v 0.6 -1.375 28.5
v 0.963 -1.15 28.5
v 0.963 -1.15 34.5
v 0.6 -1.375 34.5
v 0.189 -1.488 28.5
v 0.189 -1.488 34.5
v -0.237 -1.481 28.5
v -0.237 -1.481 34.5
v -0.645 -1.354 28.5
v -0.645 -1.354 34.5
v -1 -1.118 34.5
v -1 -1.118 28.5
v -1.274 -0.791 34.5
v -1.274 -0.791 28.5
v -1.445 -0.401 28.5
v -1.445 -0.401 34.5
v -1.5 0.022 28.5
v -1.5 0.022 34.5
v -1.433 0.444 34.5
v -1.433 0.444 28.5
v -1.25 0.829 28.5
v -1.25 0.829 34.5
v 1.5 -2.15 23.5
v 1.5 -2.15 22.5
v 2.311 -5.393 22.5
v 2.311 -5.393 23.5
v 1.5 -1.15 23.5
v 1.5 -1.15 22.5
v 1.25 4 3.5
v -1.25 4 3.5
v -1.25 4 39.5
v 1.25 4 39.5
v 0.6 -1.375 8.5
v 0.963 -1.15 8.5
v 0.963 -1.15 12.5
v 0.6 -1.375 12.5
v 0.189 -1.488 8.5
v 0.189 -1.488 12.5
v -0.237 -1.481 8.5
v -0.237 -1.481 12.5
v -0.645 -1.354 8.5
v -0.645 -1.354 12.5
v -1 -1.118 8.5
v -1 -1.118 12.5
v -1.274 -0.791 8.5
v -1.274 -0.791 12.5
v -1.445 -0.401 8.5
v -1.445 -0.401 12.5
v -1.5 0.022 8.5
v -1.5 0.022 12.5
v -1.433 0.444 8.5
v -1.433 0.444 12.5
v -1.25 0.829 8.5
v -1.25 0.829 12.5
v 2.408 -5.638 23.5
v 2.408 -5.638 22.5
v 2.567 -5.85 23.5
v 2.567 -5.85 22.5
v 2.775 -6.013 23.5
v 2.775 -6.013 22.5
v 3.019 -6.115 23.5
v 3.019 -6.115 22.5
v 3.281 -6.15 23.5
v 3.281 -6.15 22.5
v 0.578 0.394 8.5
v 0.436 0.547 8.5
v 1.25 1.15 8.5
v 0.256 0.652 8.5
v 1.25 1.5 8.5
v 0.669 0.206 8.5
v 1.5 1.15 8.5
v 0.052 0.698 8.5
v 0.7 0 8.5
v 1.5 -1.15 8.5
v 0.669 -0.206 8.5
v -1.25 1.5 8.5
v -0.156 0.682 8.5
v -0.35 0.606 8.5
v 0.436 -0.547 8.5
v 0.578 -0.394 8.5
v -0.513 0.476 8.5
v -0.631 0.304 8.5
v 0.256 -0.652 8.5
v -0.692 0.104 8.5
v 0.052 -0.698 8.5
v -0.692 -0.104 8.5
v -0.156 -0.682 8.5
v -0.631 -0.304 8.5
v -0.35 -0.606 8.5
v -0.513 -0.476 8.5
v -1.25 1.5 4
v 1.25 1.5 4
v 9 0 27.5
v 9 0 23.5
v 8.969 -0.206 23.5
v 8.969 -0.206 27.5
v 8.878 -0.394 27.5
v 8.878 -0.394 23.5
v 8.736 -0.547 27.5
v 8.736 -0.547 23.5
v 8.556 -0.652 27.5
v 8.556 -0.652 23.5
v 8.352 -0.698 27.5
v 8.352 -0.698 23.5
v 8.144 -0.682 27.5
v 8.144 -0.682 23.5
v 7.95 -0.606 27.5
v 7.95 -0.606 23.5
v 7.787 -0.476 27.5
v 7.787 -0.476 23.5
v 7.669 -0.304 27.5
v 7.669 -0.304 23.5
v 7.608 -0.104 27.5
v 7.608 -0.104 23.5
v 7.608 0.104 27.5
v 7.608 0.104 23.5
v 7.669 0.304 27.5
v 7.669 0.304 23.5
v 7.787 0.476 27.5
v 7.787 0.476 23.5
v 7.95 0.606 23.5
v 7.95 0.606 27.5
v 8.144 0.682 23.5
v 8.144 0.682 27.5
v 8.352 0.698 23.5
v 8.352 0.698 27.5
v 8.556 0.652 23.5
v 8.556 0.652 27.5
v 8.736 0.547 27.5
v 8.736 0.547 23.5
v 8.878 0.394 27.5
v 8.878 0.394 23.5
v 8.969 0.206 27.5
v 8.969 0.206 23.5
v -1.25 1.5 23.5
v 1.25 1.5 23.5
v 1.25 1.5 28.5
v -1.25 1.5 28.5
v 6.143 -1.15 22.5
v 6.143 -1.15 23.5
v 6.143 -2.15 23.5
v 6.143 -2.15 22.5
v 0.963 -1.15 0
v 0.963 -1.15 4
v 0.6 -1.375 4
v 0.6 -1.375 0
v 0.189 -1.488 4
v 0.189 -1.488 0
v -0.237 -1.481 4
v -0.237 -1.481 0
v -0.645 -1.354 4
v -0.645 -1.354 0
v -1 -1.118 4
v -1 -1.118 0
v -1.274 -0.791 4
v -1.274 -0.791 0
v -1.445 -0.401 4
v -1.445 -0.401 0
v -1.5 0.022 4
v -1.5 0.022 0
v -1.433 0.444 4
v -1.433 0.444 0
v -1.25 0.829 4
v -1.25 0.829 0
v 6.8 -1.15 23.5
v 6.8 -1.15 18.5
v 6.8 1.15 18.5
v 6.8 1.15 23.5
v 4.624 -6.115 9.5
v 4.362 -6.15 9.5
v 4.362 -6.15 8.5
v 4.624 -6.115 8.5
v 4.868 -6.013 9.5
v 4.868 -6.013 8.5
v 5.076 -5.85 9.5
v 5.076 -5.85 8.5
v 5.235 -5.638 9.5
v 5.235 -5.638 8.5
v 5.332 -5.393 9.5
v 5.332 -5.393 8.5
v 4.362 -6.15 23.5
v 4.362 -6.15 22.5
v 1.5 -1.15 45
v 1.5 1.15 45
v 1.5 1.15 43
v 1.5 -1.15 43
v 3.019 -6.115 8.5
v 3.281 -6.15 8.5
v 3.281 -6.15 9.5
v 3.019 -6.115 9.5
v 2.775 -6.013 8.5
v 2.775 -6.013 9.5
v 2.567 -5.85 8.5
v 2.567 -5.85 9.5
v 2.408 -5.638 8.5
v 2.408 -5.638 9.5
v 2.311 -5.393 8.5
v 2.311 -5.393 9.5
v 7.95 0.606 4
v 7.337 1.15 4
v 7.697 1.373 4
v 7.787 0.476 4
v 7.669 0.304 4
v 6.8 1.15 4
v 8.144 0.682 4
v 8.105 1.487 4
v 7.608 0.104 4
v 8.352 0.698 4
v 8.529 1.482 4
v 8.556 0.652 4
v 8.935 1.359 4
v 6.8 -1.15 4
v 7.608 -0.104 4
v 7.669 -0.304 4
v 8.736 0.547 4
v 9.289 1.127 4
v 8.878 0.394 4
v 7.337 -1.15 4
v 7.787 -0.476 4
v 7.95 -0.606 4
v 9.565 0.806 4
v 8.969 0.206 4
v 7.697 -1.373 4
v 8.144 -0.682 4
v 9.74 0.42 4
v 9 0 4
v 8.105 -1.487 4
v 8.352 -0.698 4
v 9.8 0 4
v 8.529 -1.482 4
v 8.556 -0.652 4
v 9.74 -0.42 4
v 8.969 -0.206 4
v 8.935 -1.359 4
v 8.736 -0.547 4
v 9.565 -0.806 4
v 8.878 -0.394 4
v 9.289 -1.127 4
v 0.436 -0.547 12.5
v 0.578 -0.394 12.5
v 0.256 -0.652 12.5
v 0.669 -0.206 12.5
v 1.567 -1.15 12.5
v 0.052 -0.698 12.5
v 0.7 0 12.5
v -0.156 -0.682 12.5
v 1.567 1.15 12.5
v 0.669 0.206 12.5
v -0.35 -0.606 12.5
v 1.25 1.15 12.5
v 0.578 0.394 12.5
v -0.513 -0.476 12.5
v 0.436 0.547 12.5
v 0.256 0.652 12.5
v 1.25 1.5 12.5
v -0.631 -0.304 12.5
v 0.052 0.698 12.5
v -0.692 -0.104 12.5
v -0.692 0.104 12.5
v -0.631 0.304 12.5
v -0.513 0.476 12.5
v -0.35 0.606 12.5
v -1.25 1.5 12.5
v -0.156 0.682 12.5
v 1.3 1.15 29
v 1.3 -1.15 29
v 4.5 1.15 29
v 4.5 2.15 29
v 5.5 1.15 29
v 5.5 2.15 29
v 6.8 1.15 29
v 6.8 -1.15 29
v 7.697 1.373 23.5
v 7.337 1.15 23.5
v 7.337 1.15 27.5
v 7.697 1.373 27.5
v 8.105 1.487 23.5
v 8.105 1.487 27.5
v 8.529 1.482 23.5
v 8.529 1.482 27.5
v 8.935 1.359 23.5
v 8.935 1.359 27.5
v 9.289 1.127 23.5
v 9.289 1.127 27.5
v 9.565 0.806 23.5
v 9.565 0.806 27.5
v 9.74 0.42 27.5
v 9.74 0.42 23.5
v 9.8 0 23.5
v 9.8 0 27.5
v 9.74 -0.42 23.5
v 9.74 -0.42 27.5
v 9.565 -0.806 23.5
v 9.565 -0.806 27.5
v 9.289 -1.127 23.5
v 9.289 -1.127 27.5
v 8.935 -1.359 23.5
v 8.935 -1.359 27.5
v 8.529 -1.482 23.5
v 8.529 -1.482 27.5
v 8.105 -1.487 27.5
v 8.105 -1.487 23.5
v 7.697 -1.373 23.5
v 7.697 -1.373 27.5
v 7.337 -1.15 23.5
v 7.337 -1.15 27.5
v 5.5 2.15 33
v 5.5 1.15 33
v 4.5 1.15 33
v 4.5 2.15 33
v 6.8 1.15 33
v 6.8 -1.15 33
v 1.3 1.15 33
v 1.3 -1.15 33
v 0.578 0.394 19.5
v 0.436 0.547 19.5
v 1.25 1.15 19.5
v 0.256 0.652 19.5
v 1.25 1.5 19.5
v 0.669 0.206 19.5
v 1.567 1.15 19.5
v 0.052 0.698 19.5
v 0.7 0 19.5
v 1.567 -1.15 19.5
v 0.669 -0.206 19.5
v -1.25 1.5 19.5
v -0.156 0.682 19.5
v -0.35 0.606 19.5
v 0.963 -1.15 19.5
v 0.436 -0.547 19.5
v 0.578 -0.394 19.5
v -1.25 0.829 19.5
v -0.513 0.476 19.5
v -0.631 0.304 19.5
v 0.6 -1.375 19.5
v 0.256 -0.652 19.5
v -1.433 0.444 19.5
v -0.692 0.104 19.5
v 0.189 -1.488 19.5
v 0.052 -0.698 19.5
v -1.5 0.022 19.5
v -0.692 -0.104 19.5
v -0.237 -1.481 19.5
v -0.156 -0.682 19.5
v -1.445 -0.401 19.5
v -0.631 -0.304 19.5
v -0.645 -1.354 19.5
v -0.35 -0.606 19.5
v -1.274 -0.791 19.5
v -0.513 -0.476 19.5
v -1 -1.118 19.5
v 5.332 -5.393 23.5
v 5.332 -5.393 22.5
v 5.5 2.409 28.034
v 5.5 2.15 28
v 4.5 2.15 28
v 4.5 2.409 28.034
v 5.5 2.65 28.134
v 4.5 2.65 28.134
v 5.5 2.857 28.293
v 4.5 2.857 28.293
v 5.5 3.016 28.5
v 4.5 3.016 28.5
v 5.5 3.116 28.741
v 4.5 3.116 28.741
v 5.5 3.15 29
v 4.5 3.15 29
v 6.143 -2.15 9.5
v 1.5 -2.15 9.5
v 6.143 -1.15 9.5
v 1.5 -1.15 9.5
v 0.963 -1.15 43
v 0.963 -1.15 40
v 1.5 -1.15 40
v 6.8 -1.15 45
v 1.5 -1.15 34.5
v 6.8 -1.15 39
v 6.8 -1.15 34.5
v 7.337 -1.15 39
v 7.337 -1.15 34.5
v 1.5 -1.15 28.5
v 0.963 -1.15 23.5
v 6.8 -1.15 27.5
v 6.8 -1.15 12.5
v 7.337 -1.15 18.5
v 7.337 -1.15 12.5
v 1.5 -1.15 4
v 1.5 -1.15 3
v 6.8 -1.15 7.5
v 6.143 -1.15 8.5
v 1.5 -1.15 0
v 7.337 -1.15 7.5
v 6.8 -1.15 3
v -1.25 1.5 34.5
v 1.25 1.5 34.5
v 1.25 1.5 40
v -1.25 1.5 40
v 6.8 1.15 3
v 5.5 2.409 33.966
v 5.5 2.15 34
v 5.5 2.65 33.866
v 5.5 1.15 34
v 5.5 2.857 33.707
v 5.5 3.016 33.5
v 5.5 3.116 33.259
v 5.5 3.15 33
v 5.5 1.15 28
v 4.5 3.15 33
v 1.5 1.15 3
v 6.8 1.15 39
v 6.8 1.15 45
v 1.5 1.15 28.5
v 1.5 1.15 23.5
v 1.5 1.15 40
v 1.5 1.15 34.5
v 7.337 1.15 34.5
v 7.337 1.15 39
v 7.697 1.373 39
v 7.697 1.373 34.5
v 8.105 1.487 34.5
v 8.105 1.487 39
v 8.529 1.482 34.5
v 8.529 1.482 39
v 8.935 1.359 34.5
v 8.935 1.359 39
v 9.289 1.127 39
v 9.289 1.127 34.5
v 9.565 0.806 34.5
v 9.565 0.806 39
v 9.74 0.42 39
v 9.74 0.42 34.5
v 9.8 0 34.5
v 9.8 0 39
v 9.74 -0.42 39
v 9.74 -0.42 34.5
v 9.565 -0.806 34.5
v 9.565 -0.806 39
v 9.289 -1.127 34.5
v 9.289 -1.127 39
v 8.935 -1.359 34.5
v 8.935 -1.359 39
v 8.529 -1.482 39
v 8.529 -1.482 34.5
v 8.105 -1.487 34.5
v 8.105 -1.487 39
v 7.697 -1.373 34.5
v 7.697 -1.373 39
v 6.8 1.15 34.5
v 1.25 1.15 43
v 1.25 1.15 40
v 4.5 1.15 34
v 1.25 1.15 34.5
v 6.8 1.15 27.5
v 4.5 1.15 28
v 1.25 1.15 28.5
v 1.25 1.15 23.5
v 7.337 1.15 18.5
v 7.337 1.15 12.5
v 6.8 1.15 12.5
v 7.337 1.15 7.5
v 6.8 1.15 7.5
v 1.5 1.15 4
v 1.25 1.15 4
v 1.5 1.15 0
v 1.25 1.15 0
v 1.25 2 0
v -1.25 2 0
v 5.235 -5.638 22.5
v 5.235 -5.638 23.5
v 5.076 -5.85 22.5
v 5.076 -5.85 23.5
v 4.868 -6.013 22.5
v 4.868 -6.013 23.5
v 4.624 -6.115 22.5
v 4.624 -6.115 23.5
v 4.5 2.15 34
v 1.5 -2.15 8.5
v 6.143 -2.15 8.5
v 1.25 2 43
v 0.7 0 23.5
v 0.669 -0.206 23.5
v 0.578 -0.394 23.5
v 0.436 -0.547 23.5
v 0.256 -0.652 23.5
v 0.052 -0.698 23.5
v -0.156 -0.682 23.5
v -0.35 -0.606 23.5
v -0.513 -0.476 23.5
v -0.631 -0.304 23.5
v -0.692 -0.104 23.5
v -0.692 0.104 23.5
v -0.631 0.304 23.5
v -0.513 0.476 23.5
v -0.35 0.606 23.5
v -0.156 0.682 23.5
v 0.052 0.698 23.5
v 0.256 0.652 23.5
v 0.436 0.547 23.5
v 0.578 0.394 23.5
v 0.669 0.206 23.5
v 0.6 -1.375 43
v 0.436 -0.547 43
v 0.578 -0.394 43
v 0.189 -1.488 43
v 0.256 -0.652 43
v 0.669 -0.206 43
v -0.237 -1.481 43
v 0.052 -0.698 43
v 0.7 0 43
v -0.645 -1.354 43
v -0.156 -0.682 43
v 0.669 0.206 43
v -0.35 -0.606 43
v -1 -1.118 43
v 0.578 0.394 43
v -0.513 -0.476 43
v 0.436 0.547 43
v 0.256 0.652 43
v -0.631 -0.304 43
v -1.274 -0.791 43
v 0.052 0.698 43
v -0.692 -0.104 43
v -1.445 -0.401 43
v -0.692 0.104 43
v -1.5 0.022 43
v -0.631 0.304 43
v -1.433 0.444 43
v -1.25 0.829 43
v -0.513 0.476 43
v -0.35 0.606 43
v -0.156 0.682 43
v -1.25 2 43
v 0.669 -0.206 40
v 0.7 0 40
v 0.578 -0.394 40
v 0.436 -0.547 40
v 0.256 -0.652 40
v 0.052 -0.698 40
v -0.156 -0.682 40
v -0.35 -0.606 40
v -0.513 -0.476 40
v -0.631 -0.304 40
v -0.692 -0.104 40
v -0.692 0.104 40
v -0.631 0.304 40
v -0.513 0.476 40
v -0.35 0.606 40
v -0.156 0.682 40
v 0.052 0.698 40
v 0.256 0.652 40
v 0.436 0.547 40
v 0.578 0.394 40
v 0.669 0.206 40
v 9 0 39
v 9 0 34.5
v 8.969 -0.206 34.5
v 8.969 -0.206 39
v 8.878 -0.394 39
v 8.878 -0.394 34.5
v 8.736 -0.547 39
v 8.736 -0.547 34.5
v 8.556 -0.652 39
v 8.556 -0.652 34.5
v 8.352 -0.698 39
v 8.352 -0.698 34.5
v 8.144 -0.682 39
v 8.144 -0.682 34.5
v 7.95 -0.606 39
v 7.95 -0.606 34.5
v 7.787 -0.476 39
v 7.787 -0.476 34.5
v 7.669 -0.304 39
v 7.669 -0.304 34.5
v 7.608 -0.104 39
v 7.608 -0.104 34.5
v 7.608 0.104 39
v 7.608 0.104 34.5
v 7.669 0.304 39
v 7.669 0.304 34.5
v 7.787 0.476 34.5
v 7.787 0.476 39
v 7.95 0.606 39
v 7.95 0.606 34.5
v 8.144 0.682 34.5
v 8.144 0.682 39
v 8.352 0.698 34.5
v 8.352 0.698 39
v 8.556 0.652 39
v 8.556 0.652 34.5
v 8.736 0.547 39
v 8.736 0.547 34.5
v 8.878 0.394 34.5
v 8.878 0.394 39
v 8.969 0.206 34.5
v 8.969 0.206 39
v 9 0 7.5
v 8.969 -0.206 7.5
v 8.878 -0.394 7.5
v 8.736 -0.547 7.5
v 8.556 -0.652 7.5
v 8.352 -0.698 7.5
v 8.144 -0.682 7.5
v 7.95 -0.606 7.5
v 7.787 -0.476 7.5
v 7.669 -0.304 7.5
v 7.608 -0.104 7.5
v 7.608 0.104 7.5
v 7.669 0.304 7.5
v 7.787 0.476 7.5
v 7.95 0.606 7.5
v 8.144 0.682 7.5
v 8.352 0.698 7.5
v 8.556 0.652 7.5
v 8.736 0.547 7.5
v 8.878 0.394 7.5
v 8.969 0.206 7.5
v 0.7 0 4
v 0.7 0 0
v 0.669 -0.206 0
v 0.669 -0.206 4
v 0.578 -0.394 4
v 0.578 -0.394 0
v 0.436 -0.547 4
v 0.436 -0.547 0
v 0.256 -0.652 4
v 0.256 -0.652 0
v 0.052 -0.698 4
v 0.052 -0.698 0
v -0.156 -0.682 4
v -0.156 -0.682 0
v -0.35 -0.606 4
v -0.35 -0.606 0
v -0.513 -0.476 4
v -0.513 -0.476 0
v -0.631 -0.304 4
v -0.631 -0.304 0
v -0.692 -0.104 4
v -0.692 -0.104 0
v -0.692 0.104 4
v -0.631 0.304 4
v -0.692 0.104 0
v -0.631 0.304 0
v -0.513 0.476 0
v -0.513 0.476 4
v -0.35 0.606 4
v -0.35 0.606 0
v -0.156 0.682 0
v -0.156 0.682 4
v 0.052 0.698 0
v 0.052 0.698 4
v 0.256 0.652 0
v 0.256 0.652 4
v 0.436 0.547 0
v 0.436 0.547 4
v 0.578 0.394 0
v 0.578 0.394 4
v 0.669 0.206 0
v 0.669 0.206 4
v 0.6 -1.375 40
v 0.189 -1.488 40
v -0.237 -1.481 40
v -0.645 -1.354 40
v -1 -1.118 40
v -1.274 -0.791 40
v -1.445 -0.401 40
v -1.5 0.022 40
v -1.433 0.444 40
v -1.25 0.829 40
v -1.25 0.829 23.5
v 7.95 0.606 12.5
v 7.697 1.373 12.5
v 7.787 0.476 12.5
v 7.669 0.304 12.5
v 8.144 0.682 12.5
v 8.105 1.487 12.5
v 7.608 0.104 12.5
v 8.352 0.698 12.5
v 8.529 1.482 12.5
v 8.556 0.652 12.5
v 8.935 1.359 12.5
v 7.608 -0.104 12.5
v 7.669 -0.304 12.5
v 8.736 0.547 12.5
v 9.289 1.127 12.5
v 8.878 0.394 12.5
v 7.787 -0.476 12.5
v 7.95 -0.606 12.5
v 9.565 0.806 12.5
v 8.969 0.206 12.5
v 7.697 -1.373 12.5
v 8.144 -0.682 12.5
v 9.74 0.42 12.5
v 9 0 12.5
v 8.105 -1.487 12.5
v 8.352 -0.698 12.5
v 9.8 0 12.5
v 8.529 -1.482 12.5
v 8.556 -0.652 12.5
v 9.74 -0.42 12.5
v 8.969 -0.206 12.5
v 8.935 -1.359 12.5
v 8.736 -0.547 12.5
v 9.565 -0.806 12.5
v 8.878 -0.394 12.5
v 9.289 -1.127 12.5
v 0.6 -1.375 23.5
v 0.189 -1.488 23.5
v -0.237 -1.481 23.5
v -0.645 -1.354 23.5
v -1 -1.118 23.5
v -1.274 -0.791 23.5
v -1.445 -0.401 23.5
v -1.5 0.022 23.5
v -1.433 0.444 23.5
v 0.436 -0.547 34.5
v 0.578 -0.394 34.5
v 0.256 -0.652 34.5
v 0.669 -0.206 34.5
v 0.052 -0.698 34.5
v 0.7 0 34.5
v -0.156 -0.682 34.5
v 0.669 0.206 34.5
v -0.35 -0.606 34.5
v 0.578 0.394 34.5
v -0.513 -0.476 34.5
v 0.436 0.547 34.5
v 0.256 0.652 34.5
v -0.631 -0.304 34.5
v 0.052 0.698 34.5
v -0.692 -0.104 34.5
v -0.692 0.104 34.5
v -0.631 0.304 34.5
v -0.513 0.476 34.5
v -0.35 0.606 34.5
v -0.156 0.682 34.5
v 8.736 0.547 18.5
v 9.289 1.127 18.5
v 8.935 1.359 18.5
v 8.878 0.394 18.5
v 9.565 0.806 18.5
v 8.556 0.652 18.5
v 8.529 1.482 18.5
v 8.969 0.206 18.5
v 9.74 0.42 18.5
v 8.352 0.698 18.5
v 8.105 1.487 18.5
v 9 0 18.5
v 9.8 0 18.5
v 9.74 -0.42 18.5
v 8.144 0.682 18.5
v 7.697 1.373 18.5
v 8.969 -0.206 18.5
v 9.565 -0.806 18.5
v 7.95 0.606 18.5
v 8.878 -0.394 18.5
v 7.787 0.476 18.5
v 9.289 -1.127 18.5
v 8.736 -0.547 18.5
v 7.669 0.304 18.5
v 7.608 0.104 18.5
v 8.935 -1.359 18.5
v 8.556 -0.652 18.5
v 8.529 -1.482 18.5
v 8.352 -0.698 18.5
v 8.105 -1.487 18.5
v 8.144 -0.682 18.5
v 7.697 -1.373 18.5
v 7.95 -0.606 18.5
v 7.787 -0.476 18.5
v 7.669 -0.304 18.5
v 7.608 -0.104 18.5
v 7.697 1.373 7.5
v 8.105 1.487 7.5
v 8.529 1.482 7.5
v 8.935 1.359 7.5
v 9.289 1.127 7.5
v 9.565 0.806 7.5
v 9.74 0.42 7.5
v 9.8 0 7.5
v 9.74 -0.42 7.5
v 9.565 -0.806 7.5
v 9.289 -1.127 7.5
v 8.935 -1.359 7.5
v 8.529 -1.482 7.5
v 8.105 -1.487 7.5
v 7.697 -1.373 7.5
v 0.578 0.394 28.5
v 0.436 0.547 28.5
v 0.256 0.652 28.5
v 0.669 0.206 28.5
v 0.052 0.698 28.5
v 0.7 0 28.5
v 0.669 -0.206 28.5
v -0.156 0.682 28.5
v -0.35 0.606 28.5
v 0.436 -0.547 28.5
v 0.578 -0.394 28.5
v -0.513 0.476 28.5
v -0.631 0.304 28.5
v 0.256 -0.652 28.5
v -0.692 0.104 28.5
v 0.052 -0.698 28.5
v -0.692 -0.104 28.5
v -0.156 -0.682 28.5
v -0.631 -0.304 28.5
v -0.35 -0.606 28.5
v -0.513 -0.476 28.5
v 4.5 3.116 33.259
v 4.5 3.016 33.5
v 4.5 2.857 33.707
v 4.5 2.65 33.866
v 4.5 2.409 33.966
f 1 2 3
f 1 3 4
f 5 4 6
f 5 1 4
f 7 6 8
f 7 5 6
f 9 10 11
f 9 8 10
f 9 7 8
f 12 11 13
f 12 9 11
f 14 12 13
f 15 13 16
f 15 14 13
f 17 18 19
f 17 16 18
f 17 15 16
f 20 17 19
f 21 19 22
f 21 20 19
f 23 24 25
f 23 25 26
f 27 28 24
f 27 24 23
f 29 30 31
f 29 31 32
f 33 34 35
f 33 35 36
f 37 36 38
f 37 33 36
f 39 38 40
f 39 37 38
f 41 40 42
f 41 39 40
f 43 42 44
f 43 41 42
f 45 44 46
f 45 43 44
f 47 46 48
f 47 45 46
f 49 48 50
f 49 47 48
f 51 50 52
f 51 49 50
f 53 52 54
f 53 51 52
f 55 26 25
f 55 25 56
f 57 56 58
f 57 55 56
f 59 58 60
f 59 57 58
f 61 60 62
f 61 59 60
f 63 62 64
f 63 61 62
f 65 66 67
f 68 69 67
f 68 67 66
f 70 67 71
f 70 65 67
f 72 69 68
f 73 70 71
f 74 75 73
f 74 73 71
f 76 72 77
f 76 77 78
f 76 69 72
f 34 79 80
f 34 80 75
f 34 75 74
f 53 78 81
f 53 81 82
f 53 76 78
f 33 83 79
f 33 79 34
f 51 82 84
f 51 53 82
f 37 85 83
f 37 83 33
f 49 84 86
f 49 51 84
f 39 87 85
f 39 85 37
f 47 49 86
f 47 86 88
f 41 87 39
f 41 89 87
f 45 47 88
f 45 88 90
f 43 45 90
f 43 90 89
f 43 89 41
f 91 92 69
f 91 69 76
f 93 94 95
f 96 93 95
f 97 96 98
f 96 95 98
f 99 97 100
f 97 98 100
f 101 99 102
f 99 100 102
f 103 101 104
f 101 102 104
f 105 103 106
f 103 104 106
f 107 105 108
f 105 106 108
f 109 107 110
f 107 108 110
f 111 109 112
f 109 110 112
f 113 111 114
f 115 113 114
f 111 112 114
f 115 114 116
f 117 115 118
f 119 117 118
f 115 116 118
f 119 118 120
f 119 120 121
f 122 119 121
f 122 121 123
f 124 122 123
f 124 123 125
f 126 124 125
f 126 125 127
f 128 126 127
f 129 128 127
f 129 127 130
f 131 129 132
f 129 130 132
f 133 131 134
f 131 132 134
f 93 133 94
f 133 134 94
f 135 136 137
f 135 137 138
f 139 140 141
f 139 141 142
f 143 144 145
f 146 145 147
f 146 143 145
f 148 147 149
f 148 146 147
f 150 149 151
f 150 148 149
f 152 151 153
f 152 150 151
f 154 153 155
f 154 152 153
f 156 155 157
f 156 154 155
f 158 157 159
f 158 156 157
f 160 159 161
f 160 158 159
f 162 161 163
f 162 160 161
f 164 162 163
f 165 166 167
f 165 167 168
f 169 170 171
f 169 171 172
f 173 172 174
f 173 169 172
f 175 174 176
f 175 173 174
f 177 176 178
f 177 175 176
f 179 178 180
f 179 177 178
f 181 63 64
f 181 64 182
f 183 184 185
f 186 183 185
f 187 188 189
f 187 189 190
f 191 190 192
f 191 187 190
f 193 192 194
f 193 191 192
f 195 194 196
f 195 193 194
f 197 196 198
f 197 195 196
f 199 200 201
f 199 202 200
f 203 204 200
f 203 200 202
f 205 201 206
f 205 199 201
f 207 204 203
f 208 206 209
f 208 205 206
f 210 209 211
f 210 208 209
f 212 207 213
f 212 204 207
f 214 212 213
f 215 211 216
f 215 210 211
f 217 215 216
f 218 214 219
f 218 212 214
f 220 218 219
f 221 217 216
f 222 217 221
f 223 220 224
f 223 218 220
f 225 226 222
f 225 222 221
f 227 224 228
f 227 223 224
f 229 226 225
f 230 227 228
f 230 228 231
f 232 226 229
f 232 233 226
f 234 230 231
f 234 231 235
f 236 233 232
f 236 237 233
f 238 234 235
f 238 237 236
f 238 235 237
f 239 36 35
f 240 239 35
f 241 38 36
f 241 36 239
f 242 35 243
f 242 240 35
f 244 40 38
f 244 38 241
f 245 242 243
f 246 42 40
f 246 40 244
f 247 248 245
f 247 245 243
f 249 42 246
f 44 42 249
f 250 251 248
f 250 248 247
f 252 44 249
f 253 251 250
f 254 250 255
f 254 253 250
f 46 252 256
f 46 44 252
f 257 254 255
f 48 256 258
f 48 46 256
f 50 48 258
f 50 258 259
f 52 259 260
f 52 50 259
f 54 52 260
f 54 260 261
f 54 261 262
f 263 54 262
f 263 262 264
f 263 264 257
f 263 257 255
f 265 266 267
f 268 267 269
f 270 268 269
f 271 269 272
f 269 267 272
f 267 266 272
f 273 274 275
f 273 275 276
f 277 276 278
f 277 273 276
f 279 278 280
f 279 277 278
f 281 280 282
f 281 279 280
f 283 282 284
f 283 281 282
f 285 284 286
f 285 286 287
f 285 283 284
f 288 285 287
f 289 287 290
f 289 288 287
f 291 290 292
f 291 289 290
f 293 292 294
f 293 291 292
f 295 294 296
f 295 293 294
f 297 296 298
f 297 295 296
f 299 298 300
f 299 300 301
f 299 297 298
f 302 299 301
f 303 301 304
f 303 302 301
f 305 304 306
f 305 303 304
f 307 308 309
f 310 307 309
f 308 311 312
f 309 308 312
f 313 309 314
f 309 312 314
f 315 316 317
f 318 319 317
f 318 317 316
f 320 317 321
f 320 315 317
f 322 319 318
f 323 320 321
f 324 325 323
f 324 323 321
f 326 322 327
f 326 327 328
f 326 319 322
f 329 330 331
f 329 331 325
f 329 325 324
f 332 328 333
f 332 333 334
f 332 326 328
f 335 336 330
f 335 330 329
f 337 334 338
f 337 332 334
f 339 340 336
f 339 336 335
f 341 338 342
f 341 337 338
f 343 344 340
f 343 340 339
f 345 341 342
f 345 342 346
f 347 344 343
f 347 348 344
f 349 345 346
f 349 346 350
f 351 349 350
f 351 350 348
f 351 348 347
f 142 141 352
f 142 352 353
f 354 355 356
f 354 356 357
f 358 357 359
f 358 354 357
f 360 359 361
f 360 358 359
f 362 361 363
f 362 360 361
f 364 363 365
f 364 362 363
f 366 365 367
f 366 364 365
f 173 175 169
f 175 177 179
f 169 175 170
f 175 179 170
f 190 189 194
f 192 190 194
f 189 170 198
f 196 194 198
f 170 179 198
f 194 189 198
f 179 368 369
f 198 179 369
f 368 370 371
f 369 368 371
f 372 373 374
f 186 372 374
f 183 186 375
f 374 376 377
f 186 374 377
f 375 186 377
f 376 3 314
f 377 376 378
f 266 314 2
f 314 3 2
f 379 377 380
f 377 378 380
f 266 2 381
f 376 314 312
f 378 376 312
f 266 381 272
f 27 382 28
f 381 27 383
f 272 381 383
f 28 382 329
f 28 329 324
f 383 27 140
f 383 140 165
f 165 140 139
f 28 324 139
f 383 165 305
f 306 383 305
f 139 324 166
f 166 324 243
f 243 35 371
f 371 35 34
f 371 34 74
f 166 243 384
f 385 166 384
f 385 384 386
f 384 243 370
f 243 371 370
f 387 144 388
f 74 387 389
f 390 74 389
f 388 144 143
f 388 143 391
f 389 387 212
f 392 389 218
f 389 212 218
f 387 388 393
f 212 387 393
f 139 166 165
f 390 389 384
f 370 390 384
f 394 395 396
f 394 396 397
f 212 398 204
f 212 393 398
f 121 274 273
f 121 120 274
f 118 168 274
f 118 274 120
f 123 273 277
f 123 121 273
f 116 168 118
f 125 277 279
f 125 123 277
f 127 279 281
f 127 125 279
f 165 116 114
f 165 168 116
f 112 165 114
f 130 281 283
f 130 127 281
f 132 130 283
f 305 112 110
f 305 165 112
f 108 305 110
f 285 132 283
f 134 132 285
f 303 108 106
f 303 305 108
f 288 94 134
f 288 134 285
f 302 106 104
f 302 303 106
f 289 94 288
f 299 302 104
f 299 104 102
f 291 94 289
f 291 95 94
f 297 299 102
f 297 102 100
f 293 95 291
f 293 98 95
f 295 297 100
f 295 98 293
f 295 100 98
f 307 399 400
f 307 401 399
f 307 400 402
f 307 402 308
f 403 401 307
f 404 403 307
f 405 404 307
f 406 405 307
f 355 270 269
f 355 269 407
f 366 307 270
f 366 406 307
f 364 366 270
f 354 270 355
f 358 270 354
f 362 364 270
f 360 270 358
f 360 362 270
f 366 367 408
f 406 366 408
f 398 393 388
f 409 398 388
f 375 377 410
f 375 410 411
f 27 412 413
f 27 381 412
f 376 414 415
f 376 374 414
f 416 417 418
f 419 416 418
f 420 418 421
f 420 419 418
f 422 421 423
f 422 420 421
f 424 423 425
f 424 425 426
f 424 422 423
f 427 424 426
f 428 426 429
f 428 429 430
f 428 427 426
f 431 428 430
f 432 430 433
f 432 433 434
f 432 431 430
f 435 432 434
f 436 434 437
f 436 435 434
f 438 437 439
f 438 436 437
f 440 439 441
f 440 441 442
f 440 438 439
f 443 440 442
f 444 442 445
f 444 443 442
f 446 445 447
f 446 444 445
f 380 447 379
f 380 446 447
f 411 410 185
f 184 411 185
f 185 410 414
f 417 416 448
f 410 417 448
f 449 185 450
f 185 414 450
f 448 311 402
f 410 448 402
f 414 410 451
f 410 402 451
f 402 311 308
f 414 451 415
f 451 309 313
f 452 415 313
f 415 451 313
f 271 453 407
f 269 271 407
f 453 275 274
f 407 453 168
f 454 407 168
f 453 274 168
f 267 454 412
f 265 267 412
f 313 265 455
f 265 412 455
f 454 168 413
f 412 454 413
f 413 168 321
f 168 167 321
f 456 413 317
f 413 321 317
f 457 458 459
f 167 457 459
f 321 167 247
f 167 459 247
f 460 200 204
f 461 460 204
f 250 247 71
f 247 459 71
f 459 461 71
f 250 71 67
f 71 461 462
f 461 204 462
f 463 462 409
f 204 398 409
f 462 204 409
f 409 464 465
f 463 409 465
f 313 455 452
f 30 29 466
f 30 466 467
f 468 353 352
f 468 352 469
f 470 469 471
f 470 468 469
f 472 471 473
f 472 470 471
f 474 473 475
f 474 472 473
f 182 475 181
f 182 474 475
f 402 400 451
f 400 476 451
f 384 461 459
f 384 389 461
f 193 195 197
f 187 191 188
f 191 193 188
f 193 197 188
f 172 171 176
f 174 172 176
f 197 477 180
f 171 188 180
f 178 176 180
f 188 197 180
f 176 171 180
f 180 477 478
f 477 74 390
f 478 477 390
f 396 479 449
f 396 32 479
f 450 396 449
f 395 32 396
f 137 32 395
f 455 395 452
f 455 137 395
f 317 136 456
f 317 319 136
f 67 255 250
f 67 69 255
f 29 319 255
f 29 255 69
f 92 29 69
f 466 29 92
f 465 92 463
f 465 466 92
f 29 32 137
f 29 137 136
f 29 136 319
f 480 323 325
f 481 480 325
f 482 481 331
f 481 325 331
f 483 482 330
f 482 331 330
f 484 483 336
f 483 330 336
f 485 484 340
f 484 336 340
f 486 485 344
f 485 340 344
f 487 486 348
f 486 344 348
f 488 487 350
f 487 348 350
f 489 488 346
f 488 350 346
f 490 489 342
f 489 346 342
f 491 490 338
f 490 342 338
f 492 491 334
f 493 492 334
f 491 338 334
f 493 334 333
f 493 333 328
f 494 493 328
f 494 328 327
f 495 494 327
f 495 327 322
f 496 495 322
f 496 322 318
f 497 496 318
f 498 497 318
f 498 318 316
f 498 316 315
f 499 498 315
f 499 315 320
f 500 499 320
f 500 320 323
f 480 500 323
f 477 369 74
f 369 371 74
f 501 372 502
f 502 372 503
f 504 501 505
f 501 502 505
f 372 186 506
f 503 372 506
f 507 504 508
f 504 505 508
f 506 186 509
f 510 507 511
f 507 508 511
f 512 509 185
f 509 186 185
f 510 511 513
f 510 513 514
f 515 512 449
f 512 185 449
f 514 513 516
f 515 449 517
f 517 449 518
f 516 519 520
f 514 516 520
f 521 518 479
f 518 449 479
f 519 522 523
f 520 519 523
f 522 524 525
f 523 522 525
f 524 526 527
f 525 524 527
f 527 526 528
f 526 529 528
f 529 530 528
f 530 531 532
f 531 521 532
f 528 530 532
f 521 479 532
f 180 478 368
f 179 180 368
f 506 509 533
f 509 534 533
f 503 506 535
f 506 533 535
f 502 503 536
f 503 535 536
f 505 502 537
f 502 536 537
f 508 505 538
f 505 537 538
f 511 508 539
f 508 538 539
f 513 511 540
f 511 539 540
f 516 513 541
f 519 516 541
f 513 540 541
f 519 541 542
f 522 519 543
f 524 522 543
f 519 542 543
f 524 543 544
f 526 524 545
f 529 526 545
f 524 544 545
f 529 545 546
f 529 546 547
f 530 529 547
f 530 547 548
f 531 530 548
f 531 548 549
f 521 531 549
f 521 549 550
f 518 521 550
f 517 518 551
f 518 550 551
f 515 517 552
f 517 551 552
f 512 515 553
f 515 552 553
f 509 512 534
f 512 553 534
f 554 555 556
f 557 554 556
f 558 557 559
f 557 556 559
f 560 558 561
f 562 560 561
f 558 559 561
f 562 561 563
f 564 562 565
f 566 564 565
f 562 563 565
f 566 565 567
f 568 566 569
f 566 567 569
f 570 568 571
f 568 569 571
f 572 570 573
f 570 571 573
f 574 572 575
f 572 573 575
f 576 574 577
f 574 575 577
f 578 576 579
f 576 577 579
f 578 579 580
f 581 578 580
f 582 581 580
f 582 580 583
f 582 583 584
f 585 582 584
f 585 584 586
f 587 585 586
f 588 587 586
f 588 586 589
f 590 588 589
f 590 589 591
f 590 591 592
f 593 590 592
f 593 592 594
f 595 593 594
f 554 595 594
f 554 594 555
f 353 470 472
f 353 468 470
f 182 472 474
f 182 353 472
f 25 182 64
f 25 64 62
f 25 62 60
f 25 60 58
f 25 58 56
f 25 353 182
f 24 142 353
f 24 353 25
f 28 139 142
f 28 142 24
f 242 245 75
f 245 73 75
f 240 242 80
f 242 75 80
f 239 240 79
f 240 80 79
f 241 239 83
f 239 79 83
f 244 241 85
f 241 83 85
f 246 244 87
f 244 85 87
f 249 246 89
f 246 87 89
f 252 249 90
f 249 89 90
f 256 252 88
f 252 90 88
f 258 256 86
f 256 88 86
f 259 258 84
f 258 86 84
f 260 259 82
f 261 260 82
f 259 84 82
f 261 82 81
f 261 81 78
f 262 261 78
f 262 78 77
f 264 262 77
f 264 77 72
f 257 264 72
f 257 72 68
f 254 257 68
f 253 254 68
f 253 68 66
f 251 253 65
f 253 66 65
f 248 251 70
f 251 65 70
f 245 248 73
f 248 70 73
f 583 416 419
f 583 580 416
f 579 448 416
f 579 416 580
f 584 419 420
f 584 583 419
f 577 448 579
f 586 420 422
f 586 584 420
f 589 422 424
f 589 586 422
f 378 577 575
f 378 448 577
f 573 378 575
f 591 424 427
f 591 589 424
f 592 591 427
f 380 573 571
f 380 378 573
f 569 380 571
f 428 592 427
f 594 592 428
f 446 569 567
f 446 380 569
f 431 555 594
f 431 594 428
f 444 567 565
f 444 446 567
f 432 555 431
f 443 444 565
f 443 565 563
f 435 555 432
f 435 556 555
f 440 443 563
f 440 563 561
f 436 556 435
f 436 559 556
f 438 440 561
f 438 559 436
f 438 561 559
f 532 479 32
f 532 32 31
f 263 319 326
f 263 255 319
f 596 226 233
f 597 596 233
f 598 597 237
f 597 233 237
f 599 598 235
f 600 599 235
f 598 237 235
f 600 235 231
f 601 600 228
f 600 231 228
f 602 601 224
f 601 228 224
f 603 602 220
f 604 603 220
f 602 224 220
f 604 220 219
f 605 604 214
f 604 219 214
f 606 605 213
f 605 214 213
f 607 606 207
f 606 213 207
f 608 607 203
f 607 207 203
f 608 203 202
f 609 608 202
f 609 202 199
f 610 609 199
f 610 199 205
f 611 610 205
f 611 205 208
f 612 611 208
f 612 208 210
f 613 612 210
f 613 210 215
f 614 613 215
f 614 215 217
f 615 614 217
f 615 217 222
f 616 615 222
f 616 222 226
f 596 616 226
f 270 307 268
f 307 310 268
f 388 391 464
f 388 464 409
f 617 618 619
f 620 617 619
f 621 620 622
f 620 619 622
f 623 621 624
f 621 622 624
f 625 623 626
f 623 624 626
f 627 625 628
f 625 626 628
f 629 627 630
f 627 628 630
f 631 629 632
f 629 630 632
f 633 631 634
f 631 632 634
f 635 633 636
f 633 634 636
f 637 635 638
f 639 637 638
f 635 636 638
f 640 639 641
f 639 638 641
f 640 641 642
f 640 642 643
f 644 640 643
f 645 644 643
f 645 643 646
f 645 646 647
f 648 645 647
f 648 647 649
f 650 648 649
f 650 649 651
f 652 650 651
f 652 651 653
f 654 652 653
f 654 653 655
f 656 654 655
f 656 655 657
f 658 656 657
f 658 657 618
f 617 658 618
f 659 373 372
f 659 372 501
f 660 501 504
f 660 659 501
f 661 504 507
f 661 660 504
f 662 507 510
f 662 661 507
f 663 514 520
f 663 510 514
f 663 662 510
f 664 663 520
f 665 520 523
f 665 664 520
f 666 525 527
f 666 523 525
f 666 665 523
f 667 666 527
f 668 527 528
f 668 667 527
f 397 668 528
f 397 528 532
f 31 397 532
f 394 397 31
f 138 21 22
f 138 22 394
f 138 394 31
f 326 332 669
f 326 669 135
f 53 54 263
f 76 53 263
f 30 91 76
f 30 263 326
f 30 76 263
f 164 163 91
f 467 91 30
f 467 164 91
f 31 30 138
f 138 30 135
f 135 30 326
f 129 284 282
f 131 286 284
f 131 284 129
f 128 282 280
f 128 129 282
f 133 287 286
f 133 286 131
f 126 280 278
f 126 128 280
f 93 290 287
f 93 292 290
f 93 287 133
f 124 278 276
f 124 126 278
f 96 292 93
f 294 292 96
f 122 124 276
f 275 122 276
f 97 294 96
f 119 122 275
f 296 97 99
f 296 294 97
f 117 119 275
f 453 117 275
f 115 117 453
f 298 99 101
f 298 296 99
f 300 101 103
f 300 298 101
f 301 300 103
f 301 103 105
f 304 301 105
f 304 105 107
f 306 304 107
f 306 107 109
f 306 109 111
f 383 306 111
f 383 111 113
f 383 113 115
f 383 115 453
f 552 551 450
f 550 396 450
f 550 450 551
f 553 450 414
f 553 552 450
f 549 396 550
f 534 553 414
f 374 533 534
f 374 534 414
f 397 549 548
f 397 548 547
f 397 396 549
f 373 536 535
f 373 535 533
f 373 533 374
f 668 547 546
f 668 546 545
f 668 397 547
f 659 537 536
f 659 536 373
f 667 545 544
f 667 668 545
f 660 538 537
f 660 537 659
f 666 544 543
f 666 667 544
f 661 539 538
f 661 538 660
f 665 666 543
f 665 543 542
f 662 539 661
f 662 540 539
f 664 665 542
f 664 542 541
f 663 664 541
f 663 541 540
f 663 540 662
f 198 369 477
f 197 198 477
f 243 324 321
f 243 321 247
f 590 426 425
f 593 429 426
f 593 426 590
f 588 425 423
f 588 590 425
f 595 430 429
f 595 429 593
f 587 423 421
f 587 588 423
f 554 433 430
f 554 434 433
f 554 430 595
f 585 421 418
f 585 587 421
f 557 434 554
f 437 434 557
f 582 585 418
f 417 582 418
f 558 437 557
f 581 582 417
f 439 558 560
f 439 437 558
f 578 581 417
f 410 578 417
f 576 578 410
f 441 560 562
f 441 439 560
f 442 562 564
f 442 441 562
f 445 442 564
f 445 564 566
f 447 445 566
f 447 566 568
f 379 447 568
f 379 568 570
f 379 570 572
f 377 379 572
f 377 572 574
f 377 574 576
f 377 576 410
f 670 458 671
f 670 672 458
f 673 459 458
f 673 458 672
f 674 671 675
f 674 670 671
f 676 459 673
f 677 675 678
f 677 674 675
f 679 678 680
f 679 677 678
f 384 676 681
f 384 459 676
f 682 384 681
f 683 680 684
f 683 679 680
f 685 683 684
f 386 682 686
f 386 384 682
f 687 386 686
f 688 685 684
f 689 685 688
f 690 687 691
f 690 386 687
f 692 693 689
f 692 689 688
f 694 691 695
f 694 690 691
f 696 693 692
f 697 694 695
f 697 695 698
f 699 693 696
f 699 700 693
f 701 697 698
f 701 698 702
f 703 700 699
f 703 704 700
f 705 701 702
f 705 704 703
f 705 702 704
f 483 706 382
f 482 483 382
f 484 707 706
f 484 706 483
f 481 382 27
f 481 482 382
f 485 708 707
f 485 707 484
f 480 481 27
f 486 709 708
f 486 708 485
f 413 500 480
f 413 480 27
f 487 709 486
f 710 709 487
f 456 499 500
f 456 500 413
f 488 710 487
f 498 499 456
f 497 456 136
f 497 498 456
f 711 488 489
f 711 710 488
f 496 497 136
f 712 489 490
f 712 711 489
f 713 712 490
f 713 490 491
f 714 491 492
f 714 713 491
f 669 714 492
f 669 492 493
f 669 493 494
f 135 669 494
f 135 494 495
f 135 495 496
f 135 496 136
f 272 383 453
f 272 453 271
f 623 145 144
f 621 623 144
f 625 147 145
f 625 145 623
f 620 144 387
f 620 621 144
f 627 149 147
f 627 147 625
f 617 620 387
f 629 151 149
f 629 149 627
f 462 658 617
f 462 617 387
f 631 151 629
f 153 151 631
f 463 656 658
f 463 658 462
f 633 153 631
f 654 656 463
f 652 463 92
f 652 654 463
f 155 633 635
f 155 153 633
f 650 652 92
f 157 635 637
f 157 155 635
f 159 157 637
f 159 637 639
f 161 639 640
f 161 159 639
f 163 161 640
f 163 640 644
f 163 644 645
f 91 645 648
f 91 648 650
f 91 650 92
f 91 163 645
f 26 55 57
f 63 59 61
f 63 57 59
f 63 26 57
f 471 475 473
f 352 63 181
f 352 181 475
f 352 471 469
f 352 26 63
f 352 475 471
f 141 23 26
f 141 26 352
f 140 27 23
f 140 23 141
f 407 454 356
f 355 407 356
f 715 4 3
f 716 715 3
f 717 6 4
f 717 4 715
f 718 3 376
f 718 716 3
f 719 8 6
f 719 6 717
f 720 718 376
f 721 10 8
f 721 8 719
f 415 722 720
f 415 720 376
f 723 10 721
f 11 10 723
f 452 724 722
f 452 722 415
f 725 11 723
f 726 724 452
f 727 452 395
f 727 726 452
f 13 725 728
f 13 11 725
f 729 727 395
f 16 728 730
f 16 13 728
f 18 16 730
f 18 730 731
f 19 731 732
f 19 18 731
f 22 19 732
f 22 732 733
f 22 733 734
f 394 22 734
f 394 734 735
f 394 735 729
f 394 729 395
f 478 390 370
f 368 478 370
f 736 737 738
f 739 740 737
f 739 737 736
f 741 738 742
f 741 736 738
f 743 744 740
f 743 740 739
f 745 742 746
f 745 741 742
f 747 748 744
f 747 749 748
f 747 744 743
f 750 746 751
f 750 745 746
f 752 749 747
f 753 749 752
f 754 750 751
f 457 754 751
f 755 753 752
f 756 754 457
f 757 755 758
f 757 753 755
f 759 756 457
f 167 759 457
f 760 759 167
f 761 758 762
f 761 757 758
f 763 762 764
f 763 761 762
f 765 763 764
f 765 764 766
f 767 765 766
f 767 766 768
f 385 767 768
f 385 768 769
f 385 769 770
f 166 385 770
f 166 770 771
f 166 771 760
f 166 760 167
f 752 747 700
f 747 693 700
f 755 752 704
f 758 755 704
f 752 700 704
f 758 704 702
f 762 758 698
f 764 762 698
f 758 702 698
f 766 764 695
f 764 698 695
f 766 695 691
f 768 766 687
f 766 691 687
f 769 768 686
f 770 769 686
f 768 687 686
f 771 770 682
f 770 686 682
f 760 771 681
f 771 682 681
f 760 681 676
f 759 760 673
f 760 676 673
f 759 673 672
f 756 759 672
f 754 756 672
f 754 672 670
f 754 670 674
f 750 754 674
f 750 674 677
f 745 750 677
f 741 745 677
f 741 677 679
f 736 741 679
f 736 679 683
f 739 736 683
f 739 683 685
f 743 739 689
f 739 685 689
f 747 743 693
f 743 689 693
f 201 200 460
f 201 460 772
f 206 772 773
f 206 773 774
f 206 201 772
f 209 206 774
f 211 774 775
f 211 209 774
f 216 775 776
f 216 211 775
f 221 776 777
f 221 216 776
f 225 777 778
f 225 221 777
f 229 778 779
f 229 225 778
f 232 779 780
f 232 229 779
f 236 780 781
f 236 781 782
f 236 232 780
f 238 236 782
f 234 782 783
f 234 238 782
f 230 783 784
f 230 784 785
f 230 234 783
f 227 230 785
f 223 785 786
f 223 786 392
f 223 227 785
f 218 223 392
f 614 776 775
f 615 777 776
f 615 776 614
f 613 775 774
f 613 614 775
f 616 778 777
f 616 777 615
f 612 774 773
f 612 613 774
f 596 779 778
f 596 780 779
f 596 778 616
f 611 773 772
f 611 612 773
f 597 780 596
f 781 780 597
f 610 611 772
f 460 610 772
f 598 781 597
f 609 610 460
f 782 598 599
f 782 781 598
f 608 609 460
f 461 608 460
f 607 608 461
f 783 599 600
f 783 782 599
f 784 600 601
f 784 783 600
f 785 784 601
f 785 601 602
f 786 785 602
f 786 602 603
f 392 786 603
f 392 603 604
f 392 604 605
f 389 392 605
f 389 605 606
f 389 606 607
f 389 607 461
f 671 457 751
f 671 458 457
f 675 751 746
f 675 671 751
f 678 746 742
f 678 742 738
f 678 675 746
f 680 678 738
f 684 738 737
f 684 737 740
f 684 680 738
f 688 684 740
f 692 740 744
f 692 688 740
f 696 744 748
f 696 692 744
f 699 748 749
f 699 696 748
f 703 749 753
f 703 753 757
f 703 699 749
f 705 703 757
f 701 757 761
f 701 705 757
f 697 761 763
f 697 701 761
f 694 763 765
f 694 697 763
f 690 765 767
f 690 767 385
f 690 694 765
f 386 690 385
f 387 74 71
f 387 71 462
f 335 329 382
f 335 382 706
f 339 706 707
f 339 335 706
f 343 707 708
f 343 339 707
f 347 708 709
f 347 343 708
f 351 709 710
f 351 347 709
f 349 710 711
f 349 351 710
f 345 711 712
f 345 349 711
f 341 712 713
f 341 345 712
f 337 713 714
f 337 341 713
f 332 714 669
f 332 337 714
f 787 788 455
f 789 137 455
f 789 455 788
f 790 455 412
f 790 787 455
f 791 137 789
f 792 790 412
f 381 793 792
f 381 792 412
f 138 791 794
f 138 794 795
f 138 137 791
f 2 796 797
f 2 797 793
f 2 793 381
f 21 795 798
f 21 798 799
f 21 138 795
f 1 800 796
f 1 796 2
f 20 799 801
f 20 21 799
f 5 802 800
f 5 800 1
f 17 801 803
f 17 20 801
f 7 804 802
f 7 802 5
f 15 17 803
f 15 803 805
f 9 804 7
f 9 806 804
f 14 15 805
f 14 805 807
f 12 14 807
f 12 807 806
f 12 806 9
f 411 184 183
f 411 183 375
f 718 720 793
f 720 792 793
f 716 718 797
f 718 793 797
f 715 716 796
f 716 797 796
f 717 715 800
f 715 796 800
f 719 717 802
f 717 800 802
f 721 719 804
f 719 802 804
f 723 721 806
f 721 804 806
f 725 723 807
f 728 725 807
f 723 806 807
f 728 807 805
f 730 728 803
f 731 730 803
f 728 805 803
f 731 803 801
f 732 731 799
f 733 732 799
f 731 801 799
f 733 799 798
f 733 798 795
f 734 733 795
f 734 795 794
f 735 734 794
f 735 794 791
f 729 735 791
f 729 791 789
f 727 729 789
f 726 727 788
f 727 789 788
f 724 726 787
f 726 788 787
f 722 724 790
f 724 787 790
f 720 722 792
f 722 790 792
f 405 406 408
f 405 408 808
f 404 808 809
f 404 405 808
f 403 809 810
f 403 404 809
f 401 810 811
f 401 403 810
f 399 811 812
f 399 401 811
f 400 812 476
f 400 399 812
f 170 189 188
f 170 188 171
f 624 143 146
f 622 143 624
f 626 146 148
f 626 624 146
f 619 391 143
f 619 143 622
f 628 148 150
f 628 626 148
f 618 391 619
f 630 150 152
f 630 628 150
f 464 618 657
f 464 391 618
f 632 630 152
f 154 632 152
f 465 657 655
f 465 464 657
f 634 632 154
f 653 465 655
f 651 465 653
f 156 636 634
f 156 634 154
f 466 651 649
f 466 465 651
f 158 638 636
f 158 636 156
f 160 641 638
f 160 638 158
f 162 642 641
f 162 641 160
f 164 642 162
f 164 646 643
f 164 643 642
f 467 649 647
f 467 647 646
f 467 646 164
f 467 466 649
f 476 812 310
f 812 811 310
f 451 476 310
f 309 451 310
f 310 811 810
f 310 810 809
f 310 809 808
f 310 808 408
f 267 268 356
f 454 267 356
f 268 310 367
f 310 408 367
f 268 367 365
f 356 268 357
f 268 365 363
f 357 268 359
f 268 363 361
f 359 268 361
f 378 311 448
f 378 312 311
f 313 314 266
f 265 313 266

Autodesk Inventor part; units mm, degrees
ref_plane "YZ Plane" through (0, 0, 0) normal (1, 0, 0) x (0, 1, 0)
ref_plane "XZ Plane" through (0, 0, 0) normal (0, 1, 0) x (-1, 0, 0)
sketch "Szkic2" plane through (0, 0, 0) normal (0, 0, 1) x (1, 0, 0)
  circle A0 centre (0, 0) radius 1.5
  circle A1 centre (8.3, 0) radius 1.5
  circle A2 centre (0, 0) radius 0.7
  circle A3 centre (8.3, 0) radius 0.7
  dimension "d0" = 3
  dimension "d1" = 8.3
  dimension "d2" = 3
  dimension "d3" = 1.4
  dimension "d4" = 1.4
sketch "Szkic3" plane through (0, 0, 0) normal (0, 0, 1) x (1, 0, 0)
  line L0 (0.9267, -1.15) -> (7.3733, -1.15)
  line L1 (7.3733, -1.15) -> (7.3733, 1.15)
  line L2 (7.3733, 1.15) -> (0.9267, 1.15)
  line L3 (0.9267, 1.15) -> (0.9267, -1.15)
  line L4 (0.9267, -1.15) -> (7.3733, 1.15) construction
  line L5 (7.3733, -1.15) -> (0.9267, 1.15) construction
  point P0 (0, 0)
  point P1 (4.15, 0)
  dimension "d5" = 4.15
  dimension "d6" = 2.3
extrude "Wyciągnięcie proste1" add sketch "Szkic2" along normal blind 45
extrude "Wyciągnięcie proste2" add sketch "Szkic3" along normal blind 45
sketch "Szkic4" plane through (0.9631, 1.15, 0) normal (0, 1, 0) x (1, 0, 0)
  line L0 (8.8369, 0) -> (8.8369, -45) projected
  line L1 (8.8369, 0) -> (8.8369, -3)
  line L2 (8.8369, -3) -> (0.5369, -3)
  line L3 (8.8369, -3) -> (5.8369, -3)
  line L4 (5.8369, -3) -> (5.8369, -4)
  line L5 (5.8369, -4) -> (8.8369, -4)
  line L6 (8.8369, -4) -> (8.8369, -3)
  line L7 (8.8369, -7.5) -> (5.8369, -7.5)
  line L8 (5.8369, -7.5) -> (5.8369, -12.5)
  line L9 (5.8369, -12.5) -> (8.8369, -12.5)
  line L10 (8.8369, -12.5) -> (8.8369, -7.5)
  line L11 (8.8369, -18.5) -> (5.8369, -18.5)
  line L12 (5.8369, -18.5) -> (5.8369, -23.5)
  line L13 (5.8369, -23.5) -> (8.8369, -23.5)
  line L14 (8.8369, -23.5) -> (8.8369, -18.5)
  line L15 (8.8369, -27.5) -> (5.8369, -27.5)
  line L16 (5.8369, -27.5) -> (5.8369, -34.5)
  line L17 (5.8369, -34.5) -> (8.8369, -34.5)
  line L18 (8.8369, -34.5) -> (8.8369, -27.5)
  line L19 (8.8369, -39) -> (5.8369, -39)
  line L20 (5.8369, -39) -> (5.8369, -45)
  line L21 (5.8369, -45) -> (8.8369, -45)
  line L22 (8.8369, -45) -> (8.8369, -39)
  line L23 (0, 0) -> (0, 0)
  line L24 (0, 0) -> (0, -45) projected
  line L25 (0, -45) -> (0, -45) projected
  line L26 (0, 0) -> (0, 0)
  line L27 (0, 0) -> (0, -45) projected
  line L28 (0, -45) -> (0, -45) projected
  line L29 (-2.4631, 0) -> (-2.4631, -45) projected
  line L30 (0, 0) -> (-2.4631, 0) projected
  line L31 (8.8369, 0) -> (6.3739, 0) projected
  line L32 (8.8369, 0) -> (0.5369, 0)
  line L33 (0.5369, 0) -> (0.5369, -3)
  line L34 (6.3739, 0) -> (0, 0) projected
  point P0 (-0.9631, 0)
  dimension "d11" = 3
  dimension "d12" = 5
  dimension "d13" = 3.5
  dimension "d14" = 1
  dimension "d15" = 5
  dimension "d16" = 6
  dimension "d17" = 7
  dimension "d18" = 4
  dimension "d19" = 4.5
  dimension "d20" = 6
  dimension "d21" = 3
  dimension "d22" = 3
  dimension "d23" = 3
  dimension "d24" = 3
  dimension "d26" = 3
  dimension "d27" = 3
extrude "Wyciągnięcie proste3" cut sketch "Szkic4" along normal mid plane 10
sketch "Szkic5" plane through (0.9631, 1.15, 45) normal (0, 1, 0) x (1, 0, 0)
  line L0 (6.3739, 6) -> (5.8369, 6) construction
  line L1 (0.5369, 41) -> (-2.4631, 41)
  line L2 (-2.4631, 41) -> (-2.4631, 36.5)
  line L3 (-2.4631, 36.5) -> (0.5369, 36.5)
  line L4 (0.5369, 36.5) -> (0.5369, 41)
  line L5 (0.6035, 32.5) -> (-2.4631, 32.5)
  line L6 (-2.4631, 32.5) -> (-2.4631, 25.5)
  line L7 (-2.4631, 25.5) -> (0.6035, 25.5)
  line L8 (0.6035, 25.5) -> (0.6035, 32.5)
  line L9 (0.5369, 21.5) -> (-2.4631, 21.5)
  line L10 (-2.4631, 21.5) -> (-2.4631, 16.5)
  line L11 (-2.4631, 16.5) -> (0.5369, 16.5)
  line L12 (0.5369, 16.5) -> (0.5369, 21.5)
  line L13 (0.5369, 10.5) -> (-2.4631, 10.5)
  line L14 (-2.4631, 10.5) -> (-2.4631, 5)
  line L15 (-2.4631, 5) -> (0.5369, 5)
  line L16 (0.5369, 5) -> (0.5369, 10.5)
  line L17 (0.5369, 2) -> (-2.4631, 2)
  line L18 (-2.4631, 2) -> (-2.4631, -1.3428)
  line L19 (-2.4631, -1.3428) -> (0.5369, -1.3428)
  line L20 (0.5369, -1.3428) -> (0.5369, 2)
  line L21 (6.3739, 17.5) -> (5.8369, 17.5) projected
  line L22 (5.8369, 17.5) -> (5.8369, 10.5) projected
  line L23 (5.8369, 10.5) -> (6.3739, 10.5) projected
  line L24 (6.3739, 6) -> (6.3739, 10.5) projected
  line L25 (6.3739, 6) -> (5.8369, 6) projected
  line L26 (5.8369, 6) -> (5.8369, 0) projected
  line L27 (0, 0) -> (5.8369, 0) projected
  line L28 (0, 45) -> (0, 0) projected
  line L29 (0, 45) -> (0.5369, 45) projected
  line L30 (0.5369, 45) -> (0.5369, 42) projected
  line L31 (0.5369, 42) -> (5.8369, 42) projected
  line L32 (5.8369, 42) -> (5.8369, 41) projected
  line L33 (5.8369, 41) -> (6.3739, 41) projected
  line L34 (6.3739, 37.5) -> (6.3739, 41) projected
  line L35 (6.3739, 37.5) -> (5.8369, 37.5) projected
  line L36 (5.8369, 37.5) -> (5.8369, 32.5) projected
  line L37 (5.8369, 32.5) -> (6.3739, 32.5) projected
  line L38 (6.3739, 26.5) -> (6.3739, 32.5) projected
  line L39 (6.3739, 26.5) -> (5.8369, 26.5) projected
  line L40 (5.8369, 26.5) -> (5.8369, 21.5) projected
  line L41 (5.8369, 21.5) -> (6.3739, 21.5) projected
  line L42 (6.3739, 17.5) -> (6.3739, 21.5) projected
  line L43 (5.8369, 12) -> (0.3369, 12)
  line L44 (0.3369, 12) -> (0.3369, 16)
  line L45 (0.3369, 16) -> (5.8369, 16)
  line L46 (5.8369, 16) -> (5.8369, 12)
  line L47 (-2.4631, 0) -> (0, 0) projected
  line L48 (0, 45) -> (-2.4631, 45) projected
  point P0 (-0.9631, 45)
  dimension "d32" = 3
  dimension "d33" = 5.5
  dimension "d34" = 4
  dimension "d35" = 1.5
  dimension "d78" = 5.5
  dimension "d79" = 6
  dimension "d80" = 5
  dimension "d81" = 4
  dimension "d82" = 7
  dimension "d83" = 4
  dimension "d84" = 4.5
  dimension "d85" = 2
  dimension "d86" = 4
extrude "Wyciągnięcie proste4" cut sketch "Szkic5" along normal mid plane 10 contours L4 L3 L28 L1 | L28 L3 L2 L1 | L28 L7 L6 L5 | L5 L8 L7 L28 | L28 L11 L10 L9 | L9 L12 L11 L28 | L28 L15 L14 L13 | L13 L16 L15 L28 | L28 L47 L18 L17 | L17 L20 L27 L28 | L27 L20 L19 L18 L47 | L43 L44 L45 L22
sketch "Szkic6" plane through (0, 0, 0) normal (0, 0, -1) x (-1, 0, 0)
  line L0 (-1, 1.5) -> (1.3193, 1.5) construction
  line L1 (-1.25, 1.5) -> (1.25, 1.5)
  line L2 (1.25, 1.5) -> (1.25, 4)
  line L3 (1.25, 4) -> (-1.25, 4)
  line L4 (-1.25, 4) -> (-1.25, 1.5)
  point P0 (0, 0)
  dimension "d36" = 1.5
  dimension "d37" = 2.5
  dimension "d38" = 2.5
  dimension "d39" = 1.25
extrude "Wyciągnięcie proste5" add sketch "Szkic6" against normal blind 43
chamfer "Faza1" distance 2 distance2 3.5 1 edges at (0, 4, 0) measured on face at (0, 3.1667, 0)
chamfer "Faza2" distance 2 distance2 3.5 1 edges at (0, 4, 43) measured on face at (0, 3.1667, 43)
sketch "Szkic7" plane through (-1.25, 1.5, 0) normal (-1, 0, 0) x (0, 0, 1)
  line L0 (39.5, 2.5) -> (43, 0.5) projected
  line L1 (3.5, 2.5) -> (39.5, 2.5) projected
  line L2 (0, 0.5) -> (3.5, 2.5) projected
  line L3 (0, 0) -> (0, 0.5) projected
  line L4 (0, 0) -> (43, 0) projected
  line L5 (43, 0.5) -> (43, 0) projected
  line L6 (0, 0) -> (4, 0) projected
  line L7 (0, -2.65) -> (0, 0) projected
  line L8 (0, -2.65) -> (4, -2.65) projected
  line L9 (4, -2.65) -> (4, 0) projected
  line L10 (4, 0) -> (4, -0.35) projected
  line L11 (4, -0.35) -> (0, -0.35) projected
  line L12 (0, 0) -> (0, -0.35) projected
  line L13 (8.5, 0) -> (12.5, 0) projected
  line L14 (8.5, 0) -> (8.5, -2.65) projected
  line L15 (8.5, -2.65) -> (12.5, -2.65) projected
  line L16 (12.5, -2.65) -> (12.5, 0) projected
  line L17 (12.5, 0) -> (12.5, -0.35) projected
  line L18 (12.5, -0.35) -> (8.5, -0.35) projected
  line L19 (8.5, -0.35) -> (8.5, 0) projected
  line L20 (19.5, 0) -> (23.5, 0) projected
  line L21 (19.5, 0) -> (19.5, -2.65) projected
  line L22 (19.5, -2.65) -> (23.5, -2.65) projected
  line L23 (23.5, -2.65) -> (23.5, 0) projected
  line L24 (23.5, 0) -> (23.5, -0.35) projected
  line L25 (23.5, -0.35) -> (19.5, -0.35) projected
  line L26 (19.5, -0.35) -> (19.5, 0) projected
  line L27 (28.5, 0) -> (34.5, 0) projected
  line L28 (28.5, 0) -> (28.5, -2.65) projected
  line L29 (28.5, -2.65) -> (34.5, -2.65) projected
  line L30 (34.5, -2.65) -> (34.5, 0) projected
  line L31 (34.5, 0) -> (34.5, -0.35) projected
  line L32 (34.5, -0.35) -> (28.5, -0.35) projected
  line L33 (28.5, -0.35) -> (28.5, 0) projected
  line L34 (40, 0) -> (43, 0) projected
  line L35 (40, 0) -> (40, -2.65) projected
  line L36 (40, -2.65) -> (43, -2.65) projected
  line L37 (43, -2.65) -> (43, 0) projected
  line L38 (43, 0) -> (43, -0.35) projected
  line L39 (43, -0.35) -> (40, -0.35) projected
  line L40 (40, -0.35) -> (40, 0) projected
  line L41 (40, -0.8) -> (43, -0.8) projected
  line L42 (43, -0.8) -> (40, -0.8)
  line L43 (40, -0.8) -> (40, 0)
  line L44 (40, 0) -> (43, 0)
  line L45 (43, 0) -> (43, -0.8)
  line L46 (34.5, -0.8) -> (28.5, -0.8)
  line L47 (28.5, -0.8) -> (28.5, 0)
  line L48 (28.5, 0) -> (34.5, 0)
  line L49 (34.5, 0) -> (34.5, -0.8)
  line L50 (23.5, -2.65) -> (23.5, -0.35) projected
  line L51 (23.5, -0.8) -> (19.5, -0.8)
  line L52 (19.5, -0.8) -> (19.5, 0)
  line L53 (19.5, 0) -> (23.5, 0)
  line L54 (23.5, 0) -> (23.5, -0.8)
  line L55 (12.5, -2.65) -> (12.5, -0.35) projected
  line L56 (12.5, -0.8) -> (8.5, -0.8)
  line L57 (8.5, -0.8) -> (8.5, 0)
  line L58 (8.5, 0) -> (12.5, 0)
  line L59 (12.5, 0) -> (12.5, -0.8)
  line L60 (0, 0) -> (43, 0) projected
  line L61 (4, -0.8) -> (0, -0.8)
  line L62 (0, -0.8) -> (0, 0)
  line L63 (0, 0) -> (4, 0)
  line L64 (4, 0) -> (4, -0.8)
extrude "Wyciągnięcie proste6" add sketch "Szkic7" against normal blind 2.5 contours L37 L39 L35 L4 | L37 L41 L35 L39 | L4 L9 L11 L7 | L30 L32 L28 L4 | L11 L9 L61 L7 | L30 L46 L28 L32 | L4 L16 L18 L14 | L23 L25 L21 L4 | L18 L16 L56 L14 | L23 L51 L21 L25
ref_plane "Płaszczyzna konstrukcyjna1" through (4.5, 1.15, 34.5) normal (1, 0, 0) x (0, 0, -1)
sketch "Szkic8" plane through (4.5, 1.15, 34.5) normal (1, 0, 0) x (0, 0, -1)
  line L0 (5.5, -2.3) -> (1.5, -2.3) projected
  line L1 (5.5, -2.3) -> (5.5, 0) projected
  line L2 (1.5, 0) -> (5.5, 0) projected
  line L3 (1.5, -2.3) -> (1.5, 0) projected
  line L4 (1.5, 0) -> (5.5, 0) projected
  line L5 (1.5, 0) -> (1.5, 1)
  line L6 (1.5, 1) -> (5.5, 1)
  line L7 (5.5, 1) -> (5.5, 0)
  line L8 (5.5, 0) -> (6.5, 0)
  line L9 (6, 0) -> (0, 0) projected
  line L10 (6.5, 0) -> (6.5, 2)
  line L11 (6.5, 2) -> (0.5, 2)
  line L12 (0.5, 2) -> (0.5, 0)
  line L13 (0, 0) -> (1.5, 0) projected
  line L14 (0.5, 0) -> (1.5, 0)
  point P0 (34.5, -1.15)
  dimension "d52" = 1
  dimension "d53" = 1
  dimension "d54" = 2
  dimension "d55" = 6
extrude "Wyciągnięcie proste7" add sketch "Szkic8" along normal blind 1 contours L7 L6 L5 L9 L12 L11 L10 L8
fillet "Zaokrąglenie1" radius 1 2 edges at (5, 3.15, 28) (5, 3.15, 34)
sketch "Szkic9" plane through (1.5, -1.15, 3) normal (0, -1, 0) x (1, 0, 0)
  line L0 (0, 5.5) -> (4.6429, 5.5)
  line L1 (4.6429, 5.5) -> (4.6429, 6.5)
  line L2 (4.6429, 6.5) -> (0, 6.5)
  line L3 (0, 6.5) -> (0, 5.5)
  line L4 (0, 20.5) -> (4.6429, 20.5)
  line L5 (4.6429, 20.5) -> (4.6429, 19.5)
  line L6 (4.6429, 19.5) -> (0, 19.5)
  line L7 (0, 19.5) -> (0, 20.5)
  line L8 (0, 0) -> (5.3, 0) projected
  point P0 (-1.5, -3)
  dimension "d74" = 13
  dimension "d75" = 5.5
  dimension "d76" = 1
  dimension "d77" = 1
extrude "Wyciągnięcie proste8" add sketch "Szkic9" along normal blind 5
chamfer "Faza3" distance 1 distance2 4 1 edges at (1.5, -6.15, 9) measured on face at (3.0476, -6.15, 9.1667)
chamfer "Faza4" distance 1 distance2 4 1 edges at (1.5, -6.15, 23) measured on face at (3.0476, -6.15, 23.1667)
chamfer "Faza5" distance 1 distance2 4 1 edges at (6.1429, -6.15, 23) measured on face at (3.7143, -6.15, 23.1667)
chamfer "Faza6" distance 1 distance2 4 1 edges at (6.1429, -6.15, 9) measured on face at (3.7143, -6.15, 9.1667)
fillet "Zaokrąglenie2" radius 1 4 edges at (2.5, -6.15, 9) (5.1429, -6.15, 9) (2.5, -6.15, 23) (5.1429, -6.15, 23)
sketch "Szkic10" plane through (1.5, -1.15, 23.5) normal (0, 0, 1) x (1, 0, 0)
  point P0 (-1.5, 1.15)
sketch "Szkic11" plane through (6.8, 1.15, 3) normal (0, 0, -1) x (-1, 0, 0)
  circle A0 centre (6.8, -1.15) radius 0.7 projected
  circle A1 centre (-1.5, -1.15) radius 0.7 projected
  dimension "d87" = 8.3
equation "\"d2\" = d0"
equation "\"d4\" = d3"
equation "\"d22\" = d21"
equation "\"d23\" = d22"
equation "\"d24\" = d23"
equation "\"d77\" = d76"
equation "\"dl_ogniwa\" = 9.073"
properties part number "ogniwo"
